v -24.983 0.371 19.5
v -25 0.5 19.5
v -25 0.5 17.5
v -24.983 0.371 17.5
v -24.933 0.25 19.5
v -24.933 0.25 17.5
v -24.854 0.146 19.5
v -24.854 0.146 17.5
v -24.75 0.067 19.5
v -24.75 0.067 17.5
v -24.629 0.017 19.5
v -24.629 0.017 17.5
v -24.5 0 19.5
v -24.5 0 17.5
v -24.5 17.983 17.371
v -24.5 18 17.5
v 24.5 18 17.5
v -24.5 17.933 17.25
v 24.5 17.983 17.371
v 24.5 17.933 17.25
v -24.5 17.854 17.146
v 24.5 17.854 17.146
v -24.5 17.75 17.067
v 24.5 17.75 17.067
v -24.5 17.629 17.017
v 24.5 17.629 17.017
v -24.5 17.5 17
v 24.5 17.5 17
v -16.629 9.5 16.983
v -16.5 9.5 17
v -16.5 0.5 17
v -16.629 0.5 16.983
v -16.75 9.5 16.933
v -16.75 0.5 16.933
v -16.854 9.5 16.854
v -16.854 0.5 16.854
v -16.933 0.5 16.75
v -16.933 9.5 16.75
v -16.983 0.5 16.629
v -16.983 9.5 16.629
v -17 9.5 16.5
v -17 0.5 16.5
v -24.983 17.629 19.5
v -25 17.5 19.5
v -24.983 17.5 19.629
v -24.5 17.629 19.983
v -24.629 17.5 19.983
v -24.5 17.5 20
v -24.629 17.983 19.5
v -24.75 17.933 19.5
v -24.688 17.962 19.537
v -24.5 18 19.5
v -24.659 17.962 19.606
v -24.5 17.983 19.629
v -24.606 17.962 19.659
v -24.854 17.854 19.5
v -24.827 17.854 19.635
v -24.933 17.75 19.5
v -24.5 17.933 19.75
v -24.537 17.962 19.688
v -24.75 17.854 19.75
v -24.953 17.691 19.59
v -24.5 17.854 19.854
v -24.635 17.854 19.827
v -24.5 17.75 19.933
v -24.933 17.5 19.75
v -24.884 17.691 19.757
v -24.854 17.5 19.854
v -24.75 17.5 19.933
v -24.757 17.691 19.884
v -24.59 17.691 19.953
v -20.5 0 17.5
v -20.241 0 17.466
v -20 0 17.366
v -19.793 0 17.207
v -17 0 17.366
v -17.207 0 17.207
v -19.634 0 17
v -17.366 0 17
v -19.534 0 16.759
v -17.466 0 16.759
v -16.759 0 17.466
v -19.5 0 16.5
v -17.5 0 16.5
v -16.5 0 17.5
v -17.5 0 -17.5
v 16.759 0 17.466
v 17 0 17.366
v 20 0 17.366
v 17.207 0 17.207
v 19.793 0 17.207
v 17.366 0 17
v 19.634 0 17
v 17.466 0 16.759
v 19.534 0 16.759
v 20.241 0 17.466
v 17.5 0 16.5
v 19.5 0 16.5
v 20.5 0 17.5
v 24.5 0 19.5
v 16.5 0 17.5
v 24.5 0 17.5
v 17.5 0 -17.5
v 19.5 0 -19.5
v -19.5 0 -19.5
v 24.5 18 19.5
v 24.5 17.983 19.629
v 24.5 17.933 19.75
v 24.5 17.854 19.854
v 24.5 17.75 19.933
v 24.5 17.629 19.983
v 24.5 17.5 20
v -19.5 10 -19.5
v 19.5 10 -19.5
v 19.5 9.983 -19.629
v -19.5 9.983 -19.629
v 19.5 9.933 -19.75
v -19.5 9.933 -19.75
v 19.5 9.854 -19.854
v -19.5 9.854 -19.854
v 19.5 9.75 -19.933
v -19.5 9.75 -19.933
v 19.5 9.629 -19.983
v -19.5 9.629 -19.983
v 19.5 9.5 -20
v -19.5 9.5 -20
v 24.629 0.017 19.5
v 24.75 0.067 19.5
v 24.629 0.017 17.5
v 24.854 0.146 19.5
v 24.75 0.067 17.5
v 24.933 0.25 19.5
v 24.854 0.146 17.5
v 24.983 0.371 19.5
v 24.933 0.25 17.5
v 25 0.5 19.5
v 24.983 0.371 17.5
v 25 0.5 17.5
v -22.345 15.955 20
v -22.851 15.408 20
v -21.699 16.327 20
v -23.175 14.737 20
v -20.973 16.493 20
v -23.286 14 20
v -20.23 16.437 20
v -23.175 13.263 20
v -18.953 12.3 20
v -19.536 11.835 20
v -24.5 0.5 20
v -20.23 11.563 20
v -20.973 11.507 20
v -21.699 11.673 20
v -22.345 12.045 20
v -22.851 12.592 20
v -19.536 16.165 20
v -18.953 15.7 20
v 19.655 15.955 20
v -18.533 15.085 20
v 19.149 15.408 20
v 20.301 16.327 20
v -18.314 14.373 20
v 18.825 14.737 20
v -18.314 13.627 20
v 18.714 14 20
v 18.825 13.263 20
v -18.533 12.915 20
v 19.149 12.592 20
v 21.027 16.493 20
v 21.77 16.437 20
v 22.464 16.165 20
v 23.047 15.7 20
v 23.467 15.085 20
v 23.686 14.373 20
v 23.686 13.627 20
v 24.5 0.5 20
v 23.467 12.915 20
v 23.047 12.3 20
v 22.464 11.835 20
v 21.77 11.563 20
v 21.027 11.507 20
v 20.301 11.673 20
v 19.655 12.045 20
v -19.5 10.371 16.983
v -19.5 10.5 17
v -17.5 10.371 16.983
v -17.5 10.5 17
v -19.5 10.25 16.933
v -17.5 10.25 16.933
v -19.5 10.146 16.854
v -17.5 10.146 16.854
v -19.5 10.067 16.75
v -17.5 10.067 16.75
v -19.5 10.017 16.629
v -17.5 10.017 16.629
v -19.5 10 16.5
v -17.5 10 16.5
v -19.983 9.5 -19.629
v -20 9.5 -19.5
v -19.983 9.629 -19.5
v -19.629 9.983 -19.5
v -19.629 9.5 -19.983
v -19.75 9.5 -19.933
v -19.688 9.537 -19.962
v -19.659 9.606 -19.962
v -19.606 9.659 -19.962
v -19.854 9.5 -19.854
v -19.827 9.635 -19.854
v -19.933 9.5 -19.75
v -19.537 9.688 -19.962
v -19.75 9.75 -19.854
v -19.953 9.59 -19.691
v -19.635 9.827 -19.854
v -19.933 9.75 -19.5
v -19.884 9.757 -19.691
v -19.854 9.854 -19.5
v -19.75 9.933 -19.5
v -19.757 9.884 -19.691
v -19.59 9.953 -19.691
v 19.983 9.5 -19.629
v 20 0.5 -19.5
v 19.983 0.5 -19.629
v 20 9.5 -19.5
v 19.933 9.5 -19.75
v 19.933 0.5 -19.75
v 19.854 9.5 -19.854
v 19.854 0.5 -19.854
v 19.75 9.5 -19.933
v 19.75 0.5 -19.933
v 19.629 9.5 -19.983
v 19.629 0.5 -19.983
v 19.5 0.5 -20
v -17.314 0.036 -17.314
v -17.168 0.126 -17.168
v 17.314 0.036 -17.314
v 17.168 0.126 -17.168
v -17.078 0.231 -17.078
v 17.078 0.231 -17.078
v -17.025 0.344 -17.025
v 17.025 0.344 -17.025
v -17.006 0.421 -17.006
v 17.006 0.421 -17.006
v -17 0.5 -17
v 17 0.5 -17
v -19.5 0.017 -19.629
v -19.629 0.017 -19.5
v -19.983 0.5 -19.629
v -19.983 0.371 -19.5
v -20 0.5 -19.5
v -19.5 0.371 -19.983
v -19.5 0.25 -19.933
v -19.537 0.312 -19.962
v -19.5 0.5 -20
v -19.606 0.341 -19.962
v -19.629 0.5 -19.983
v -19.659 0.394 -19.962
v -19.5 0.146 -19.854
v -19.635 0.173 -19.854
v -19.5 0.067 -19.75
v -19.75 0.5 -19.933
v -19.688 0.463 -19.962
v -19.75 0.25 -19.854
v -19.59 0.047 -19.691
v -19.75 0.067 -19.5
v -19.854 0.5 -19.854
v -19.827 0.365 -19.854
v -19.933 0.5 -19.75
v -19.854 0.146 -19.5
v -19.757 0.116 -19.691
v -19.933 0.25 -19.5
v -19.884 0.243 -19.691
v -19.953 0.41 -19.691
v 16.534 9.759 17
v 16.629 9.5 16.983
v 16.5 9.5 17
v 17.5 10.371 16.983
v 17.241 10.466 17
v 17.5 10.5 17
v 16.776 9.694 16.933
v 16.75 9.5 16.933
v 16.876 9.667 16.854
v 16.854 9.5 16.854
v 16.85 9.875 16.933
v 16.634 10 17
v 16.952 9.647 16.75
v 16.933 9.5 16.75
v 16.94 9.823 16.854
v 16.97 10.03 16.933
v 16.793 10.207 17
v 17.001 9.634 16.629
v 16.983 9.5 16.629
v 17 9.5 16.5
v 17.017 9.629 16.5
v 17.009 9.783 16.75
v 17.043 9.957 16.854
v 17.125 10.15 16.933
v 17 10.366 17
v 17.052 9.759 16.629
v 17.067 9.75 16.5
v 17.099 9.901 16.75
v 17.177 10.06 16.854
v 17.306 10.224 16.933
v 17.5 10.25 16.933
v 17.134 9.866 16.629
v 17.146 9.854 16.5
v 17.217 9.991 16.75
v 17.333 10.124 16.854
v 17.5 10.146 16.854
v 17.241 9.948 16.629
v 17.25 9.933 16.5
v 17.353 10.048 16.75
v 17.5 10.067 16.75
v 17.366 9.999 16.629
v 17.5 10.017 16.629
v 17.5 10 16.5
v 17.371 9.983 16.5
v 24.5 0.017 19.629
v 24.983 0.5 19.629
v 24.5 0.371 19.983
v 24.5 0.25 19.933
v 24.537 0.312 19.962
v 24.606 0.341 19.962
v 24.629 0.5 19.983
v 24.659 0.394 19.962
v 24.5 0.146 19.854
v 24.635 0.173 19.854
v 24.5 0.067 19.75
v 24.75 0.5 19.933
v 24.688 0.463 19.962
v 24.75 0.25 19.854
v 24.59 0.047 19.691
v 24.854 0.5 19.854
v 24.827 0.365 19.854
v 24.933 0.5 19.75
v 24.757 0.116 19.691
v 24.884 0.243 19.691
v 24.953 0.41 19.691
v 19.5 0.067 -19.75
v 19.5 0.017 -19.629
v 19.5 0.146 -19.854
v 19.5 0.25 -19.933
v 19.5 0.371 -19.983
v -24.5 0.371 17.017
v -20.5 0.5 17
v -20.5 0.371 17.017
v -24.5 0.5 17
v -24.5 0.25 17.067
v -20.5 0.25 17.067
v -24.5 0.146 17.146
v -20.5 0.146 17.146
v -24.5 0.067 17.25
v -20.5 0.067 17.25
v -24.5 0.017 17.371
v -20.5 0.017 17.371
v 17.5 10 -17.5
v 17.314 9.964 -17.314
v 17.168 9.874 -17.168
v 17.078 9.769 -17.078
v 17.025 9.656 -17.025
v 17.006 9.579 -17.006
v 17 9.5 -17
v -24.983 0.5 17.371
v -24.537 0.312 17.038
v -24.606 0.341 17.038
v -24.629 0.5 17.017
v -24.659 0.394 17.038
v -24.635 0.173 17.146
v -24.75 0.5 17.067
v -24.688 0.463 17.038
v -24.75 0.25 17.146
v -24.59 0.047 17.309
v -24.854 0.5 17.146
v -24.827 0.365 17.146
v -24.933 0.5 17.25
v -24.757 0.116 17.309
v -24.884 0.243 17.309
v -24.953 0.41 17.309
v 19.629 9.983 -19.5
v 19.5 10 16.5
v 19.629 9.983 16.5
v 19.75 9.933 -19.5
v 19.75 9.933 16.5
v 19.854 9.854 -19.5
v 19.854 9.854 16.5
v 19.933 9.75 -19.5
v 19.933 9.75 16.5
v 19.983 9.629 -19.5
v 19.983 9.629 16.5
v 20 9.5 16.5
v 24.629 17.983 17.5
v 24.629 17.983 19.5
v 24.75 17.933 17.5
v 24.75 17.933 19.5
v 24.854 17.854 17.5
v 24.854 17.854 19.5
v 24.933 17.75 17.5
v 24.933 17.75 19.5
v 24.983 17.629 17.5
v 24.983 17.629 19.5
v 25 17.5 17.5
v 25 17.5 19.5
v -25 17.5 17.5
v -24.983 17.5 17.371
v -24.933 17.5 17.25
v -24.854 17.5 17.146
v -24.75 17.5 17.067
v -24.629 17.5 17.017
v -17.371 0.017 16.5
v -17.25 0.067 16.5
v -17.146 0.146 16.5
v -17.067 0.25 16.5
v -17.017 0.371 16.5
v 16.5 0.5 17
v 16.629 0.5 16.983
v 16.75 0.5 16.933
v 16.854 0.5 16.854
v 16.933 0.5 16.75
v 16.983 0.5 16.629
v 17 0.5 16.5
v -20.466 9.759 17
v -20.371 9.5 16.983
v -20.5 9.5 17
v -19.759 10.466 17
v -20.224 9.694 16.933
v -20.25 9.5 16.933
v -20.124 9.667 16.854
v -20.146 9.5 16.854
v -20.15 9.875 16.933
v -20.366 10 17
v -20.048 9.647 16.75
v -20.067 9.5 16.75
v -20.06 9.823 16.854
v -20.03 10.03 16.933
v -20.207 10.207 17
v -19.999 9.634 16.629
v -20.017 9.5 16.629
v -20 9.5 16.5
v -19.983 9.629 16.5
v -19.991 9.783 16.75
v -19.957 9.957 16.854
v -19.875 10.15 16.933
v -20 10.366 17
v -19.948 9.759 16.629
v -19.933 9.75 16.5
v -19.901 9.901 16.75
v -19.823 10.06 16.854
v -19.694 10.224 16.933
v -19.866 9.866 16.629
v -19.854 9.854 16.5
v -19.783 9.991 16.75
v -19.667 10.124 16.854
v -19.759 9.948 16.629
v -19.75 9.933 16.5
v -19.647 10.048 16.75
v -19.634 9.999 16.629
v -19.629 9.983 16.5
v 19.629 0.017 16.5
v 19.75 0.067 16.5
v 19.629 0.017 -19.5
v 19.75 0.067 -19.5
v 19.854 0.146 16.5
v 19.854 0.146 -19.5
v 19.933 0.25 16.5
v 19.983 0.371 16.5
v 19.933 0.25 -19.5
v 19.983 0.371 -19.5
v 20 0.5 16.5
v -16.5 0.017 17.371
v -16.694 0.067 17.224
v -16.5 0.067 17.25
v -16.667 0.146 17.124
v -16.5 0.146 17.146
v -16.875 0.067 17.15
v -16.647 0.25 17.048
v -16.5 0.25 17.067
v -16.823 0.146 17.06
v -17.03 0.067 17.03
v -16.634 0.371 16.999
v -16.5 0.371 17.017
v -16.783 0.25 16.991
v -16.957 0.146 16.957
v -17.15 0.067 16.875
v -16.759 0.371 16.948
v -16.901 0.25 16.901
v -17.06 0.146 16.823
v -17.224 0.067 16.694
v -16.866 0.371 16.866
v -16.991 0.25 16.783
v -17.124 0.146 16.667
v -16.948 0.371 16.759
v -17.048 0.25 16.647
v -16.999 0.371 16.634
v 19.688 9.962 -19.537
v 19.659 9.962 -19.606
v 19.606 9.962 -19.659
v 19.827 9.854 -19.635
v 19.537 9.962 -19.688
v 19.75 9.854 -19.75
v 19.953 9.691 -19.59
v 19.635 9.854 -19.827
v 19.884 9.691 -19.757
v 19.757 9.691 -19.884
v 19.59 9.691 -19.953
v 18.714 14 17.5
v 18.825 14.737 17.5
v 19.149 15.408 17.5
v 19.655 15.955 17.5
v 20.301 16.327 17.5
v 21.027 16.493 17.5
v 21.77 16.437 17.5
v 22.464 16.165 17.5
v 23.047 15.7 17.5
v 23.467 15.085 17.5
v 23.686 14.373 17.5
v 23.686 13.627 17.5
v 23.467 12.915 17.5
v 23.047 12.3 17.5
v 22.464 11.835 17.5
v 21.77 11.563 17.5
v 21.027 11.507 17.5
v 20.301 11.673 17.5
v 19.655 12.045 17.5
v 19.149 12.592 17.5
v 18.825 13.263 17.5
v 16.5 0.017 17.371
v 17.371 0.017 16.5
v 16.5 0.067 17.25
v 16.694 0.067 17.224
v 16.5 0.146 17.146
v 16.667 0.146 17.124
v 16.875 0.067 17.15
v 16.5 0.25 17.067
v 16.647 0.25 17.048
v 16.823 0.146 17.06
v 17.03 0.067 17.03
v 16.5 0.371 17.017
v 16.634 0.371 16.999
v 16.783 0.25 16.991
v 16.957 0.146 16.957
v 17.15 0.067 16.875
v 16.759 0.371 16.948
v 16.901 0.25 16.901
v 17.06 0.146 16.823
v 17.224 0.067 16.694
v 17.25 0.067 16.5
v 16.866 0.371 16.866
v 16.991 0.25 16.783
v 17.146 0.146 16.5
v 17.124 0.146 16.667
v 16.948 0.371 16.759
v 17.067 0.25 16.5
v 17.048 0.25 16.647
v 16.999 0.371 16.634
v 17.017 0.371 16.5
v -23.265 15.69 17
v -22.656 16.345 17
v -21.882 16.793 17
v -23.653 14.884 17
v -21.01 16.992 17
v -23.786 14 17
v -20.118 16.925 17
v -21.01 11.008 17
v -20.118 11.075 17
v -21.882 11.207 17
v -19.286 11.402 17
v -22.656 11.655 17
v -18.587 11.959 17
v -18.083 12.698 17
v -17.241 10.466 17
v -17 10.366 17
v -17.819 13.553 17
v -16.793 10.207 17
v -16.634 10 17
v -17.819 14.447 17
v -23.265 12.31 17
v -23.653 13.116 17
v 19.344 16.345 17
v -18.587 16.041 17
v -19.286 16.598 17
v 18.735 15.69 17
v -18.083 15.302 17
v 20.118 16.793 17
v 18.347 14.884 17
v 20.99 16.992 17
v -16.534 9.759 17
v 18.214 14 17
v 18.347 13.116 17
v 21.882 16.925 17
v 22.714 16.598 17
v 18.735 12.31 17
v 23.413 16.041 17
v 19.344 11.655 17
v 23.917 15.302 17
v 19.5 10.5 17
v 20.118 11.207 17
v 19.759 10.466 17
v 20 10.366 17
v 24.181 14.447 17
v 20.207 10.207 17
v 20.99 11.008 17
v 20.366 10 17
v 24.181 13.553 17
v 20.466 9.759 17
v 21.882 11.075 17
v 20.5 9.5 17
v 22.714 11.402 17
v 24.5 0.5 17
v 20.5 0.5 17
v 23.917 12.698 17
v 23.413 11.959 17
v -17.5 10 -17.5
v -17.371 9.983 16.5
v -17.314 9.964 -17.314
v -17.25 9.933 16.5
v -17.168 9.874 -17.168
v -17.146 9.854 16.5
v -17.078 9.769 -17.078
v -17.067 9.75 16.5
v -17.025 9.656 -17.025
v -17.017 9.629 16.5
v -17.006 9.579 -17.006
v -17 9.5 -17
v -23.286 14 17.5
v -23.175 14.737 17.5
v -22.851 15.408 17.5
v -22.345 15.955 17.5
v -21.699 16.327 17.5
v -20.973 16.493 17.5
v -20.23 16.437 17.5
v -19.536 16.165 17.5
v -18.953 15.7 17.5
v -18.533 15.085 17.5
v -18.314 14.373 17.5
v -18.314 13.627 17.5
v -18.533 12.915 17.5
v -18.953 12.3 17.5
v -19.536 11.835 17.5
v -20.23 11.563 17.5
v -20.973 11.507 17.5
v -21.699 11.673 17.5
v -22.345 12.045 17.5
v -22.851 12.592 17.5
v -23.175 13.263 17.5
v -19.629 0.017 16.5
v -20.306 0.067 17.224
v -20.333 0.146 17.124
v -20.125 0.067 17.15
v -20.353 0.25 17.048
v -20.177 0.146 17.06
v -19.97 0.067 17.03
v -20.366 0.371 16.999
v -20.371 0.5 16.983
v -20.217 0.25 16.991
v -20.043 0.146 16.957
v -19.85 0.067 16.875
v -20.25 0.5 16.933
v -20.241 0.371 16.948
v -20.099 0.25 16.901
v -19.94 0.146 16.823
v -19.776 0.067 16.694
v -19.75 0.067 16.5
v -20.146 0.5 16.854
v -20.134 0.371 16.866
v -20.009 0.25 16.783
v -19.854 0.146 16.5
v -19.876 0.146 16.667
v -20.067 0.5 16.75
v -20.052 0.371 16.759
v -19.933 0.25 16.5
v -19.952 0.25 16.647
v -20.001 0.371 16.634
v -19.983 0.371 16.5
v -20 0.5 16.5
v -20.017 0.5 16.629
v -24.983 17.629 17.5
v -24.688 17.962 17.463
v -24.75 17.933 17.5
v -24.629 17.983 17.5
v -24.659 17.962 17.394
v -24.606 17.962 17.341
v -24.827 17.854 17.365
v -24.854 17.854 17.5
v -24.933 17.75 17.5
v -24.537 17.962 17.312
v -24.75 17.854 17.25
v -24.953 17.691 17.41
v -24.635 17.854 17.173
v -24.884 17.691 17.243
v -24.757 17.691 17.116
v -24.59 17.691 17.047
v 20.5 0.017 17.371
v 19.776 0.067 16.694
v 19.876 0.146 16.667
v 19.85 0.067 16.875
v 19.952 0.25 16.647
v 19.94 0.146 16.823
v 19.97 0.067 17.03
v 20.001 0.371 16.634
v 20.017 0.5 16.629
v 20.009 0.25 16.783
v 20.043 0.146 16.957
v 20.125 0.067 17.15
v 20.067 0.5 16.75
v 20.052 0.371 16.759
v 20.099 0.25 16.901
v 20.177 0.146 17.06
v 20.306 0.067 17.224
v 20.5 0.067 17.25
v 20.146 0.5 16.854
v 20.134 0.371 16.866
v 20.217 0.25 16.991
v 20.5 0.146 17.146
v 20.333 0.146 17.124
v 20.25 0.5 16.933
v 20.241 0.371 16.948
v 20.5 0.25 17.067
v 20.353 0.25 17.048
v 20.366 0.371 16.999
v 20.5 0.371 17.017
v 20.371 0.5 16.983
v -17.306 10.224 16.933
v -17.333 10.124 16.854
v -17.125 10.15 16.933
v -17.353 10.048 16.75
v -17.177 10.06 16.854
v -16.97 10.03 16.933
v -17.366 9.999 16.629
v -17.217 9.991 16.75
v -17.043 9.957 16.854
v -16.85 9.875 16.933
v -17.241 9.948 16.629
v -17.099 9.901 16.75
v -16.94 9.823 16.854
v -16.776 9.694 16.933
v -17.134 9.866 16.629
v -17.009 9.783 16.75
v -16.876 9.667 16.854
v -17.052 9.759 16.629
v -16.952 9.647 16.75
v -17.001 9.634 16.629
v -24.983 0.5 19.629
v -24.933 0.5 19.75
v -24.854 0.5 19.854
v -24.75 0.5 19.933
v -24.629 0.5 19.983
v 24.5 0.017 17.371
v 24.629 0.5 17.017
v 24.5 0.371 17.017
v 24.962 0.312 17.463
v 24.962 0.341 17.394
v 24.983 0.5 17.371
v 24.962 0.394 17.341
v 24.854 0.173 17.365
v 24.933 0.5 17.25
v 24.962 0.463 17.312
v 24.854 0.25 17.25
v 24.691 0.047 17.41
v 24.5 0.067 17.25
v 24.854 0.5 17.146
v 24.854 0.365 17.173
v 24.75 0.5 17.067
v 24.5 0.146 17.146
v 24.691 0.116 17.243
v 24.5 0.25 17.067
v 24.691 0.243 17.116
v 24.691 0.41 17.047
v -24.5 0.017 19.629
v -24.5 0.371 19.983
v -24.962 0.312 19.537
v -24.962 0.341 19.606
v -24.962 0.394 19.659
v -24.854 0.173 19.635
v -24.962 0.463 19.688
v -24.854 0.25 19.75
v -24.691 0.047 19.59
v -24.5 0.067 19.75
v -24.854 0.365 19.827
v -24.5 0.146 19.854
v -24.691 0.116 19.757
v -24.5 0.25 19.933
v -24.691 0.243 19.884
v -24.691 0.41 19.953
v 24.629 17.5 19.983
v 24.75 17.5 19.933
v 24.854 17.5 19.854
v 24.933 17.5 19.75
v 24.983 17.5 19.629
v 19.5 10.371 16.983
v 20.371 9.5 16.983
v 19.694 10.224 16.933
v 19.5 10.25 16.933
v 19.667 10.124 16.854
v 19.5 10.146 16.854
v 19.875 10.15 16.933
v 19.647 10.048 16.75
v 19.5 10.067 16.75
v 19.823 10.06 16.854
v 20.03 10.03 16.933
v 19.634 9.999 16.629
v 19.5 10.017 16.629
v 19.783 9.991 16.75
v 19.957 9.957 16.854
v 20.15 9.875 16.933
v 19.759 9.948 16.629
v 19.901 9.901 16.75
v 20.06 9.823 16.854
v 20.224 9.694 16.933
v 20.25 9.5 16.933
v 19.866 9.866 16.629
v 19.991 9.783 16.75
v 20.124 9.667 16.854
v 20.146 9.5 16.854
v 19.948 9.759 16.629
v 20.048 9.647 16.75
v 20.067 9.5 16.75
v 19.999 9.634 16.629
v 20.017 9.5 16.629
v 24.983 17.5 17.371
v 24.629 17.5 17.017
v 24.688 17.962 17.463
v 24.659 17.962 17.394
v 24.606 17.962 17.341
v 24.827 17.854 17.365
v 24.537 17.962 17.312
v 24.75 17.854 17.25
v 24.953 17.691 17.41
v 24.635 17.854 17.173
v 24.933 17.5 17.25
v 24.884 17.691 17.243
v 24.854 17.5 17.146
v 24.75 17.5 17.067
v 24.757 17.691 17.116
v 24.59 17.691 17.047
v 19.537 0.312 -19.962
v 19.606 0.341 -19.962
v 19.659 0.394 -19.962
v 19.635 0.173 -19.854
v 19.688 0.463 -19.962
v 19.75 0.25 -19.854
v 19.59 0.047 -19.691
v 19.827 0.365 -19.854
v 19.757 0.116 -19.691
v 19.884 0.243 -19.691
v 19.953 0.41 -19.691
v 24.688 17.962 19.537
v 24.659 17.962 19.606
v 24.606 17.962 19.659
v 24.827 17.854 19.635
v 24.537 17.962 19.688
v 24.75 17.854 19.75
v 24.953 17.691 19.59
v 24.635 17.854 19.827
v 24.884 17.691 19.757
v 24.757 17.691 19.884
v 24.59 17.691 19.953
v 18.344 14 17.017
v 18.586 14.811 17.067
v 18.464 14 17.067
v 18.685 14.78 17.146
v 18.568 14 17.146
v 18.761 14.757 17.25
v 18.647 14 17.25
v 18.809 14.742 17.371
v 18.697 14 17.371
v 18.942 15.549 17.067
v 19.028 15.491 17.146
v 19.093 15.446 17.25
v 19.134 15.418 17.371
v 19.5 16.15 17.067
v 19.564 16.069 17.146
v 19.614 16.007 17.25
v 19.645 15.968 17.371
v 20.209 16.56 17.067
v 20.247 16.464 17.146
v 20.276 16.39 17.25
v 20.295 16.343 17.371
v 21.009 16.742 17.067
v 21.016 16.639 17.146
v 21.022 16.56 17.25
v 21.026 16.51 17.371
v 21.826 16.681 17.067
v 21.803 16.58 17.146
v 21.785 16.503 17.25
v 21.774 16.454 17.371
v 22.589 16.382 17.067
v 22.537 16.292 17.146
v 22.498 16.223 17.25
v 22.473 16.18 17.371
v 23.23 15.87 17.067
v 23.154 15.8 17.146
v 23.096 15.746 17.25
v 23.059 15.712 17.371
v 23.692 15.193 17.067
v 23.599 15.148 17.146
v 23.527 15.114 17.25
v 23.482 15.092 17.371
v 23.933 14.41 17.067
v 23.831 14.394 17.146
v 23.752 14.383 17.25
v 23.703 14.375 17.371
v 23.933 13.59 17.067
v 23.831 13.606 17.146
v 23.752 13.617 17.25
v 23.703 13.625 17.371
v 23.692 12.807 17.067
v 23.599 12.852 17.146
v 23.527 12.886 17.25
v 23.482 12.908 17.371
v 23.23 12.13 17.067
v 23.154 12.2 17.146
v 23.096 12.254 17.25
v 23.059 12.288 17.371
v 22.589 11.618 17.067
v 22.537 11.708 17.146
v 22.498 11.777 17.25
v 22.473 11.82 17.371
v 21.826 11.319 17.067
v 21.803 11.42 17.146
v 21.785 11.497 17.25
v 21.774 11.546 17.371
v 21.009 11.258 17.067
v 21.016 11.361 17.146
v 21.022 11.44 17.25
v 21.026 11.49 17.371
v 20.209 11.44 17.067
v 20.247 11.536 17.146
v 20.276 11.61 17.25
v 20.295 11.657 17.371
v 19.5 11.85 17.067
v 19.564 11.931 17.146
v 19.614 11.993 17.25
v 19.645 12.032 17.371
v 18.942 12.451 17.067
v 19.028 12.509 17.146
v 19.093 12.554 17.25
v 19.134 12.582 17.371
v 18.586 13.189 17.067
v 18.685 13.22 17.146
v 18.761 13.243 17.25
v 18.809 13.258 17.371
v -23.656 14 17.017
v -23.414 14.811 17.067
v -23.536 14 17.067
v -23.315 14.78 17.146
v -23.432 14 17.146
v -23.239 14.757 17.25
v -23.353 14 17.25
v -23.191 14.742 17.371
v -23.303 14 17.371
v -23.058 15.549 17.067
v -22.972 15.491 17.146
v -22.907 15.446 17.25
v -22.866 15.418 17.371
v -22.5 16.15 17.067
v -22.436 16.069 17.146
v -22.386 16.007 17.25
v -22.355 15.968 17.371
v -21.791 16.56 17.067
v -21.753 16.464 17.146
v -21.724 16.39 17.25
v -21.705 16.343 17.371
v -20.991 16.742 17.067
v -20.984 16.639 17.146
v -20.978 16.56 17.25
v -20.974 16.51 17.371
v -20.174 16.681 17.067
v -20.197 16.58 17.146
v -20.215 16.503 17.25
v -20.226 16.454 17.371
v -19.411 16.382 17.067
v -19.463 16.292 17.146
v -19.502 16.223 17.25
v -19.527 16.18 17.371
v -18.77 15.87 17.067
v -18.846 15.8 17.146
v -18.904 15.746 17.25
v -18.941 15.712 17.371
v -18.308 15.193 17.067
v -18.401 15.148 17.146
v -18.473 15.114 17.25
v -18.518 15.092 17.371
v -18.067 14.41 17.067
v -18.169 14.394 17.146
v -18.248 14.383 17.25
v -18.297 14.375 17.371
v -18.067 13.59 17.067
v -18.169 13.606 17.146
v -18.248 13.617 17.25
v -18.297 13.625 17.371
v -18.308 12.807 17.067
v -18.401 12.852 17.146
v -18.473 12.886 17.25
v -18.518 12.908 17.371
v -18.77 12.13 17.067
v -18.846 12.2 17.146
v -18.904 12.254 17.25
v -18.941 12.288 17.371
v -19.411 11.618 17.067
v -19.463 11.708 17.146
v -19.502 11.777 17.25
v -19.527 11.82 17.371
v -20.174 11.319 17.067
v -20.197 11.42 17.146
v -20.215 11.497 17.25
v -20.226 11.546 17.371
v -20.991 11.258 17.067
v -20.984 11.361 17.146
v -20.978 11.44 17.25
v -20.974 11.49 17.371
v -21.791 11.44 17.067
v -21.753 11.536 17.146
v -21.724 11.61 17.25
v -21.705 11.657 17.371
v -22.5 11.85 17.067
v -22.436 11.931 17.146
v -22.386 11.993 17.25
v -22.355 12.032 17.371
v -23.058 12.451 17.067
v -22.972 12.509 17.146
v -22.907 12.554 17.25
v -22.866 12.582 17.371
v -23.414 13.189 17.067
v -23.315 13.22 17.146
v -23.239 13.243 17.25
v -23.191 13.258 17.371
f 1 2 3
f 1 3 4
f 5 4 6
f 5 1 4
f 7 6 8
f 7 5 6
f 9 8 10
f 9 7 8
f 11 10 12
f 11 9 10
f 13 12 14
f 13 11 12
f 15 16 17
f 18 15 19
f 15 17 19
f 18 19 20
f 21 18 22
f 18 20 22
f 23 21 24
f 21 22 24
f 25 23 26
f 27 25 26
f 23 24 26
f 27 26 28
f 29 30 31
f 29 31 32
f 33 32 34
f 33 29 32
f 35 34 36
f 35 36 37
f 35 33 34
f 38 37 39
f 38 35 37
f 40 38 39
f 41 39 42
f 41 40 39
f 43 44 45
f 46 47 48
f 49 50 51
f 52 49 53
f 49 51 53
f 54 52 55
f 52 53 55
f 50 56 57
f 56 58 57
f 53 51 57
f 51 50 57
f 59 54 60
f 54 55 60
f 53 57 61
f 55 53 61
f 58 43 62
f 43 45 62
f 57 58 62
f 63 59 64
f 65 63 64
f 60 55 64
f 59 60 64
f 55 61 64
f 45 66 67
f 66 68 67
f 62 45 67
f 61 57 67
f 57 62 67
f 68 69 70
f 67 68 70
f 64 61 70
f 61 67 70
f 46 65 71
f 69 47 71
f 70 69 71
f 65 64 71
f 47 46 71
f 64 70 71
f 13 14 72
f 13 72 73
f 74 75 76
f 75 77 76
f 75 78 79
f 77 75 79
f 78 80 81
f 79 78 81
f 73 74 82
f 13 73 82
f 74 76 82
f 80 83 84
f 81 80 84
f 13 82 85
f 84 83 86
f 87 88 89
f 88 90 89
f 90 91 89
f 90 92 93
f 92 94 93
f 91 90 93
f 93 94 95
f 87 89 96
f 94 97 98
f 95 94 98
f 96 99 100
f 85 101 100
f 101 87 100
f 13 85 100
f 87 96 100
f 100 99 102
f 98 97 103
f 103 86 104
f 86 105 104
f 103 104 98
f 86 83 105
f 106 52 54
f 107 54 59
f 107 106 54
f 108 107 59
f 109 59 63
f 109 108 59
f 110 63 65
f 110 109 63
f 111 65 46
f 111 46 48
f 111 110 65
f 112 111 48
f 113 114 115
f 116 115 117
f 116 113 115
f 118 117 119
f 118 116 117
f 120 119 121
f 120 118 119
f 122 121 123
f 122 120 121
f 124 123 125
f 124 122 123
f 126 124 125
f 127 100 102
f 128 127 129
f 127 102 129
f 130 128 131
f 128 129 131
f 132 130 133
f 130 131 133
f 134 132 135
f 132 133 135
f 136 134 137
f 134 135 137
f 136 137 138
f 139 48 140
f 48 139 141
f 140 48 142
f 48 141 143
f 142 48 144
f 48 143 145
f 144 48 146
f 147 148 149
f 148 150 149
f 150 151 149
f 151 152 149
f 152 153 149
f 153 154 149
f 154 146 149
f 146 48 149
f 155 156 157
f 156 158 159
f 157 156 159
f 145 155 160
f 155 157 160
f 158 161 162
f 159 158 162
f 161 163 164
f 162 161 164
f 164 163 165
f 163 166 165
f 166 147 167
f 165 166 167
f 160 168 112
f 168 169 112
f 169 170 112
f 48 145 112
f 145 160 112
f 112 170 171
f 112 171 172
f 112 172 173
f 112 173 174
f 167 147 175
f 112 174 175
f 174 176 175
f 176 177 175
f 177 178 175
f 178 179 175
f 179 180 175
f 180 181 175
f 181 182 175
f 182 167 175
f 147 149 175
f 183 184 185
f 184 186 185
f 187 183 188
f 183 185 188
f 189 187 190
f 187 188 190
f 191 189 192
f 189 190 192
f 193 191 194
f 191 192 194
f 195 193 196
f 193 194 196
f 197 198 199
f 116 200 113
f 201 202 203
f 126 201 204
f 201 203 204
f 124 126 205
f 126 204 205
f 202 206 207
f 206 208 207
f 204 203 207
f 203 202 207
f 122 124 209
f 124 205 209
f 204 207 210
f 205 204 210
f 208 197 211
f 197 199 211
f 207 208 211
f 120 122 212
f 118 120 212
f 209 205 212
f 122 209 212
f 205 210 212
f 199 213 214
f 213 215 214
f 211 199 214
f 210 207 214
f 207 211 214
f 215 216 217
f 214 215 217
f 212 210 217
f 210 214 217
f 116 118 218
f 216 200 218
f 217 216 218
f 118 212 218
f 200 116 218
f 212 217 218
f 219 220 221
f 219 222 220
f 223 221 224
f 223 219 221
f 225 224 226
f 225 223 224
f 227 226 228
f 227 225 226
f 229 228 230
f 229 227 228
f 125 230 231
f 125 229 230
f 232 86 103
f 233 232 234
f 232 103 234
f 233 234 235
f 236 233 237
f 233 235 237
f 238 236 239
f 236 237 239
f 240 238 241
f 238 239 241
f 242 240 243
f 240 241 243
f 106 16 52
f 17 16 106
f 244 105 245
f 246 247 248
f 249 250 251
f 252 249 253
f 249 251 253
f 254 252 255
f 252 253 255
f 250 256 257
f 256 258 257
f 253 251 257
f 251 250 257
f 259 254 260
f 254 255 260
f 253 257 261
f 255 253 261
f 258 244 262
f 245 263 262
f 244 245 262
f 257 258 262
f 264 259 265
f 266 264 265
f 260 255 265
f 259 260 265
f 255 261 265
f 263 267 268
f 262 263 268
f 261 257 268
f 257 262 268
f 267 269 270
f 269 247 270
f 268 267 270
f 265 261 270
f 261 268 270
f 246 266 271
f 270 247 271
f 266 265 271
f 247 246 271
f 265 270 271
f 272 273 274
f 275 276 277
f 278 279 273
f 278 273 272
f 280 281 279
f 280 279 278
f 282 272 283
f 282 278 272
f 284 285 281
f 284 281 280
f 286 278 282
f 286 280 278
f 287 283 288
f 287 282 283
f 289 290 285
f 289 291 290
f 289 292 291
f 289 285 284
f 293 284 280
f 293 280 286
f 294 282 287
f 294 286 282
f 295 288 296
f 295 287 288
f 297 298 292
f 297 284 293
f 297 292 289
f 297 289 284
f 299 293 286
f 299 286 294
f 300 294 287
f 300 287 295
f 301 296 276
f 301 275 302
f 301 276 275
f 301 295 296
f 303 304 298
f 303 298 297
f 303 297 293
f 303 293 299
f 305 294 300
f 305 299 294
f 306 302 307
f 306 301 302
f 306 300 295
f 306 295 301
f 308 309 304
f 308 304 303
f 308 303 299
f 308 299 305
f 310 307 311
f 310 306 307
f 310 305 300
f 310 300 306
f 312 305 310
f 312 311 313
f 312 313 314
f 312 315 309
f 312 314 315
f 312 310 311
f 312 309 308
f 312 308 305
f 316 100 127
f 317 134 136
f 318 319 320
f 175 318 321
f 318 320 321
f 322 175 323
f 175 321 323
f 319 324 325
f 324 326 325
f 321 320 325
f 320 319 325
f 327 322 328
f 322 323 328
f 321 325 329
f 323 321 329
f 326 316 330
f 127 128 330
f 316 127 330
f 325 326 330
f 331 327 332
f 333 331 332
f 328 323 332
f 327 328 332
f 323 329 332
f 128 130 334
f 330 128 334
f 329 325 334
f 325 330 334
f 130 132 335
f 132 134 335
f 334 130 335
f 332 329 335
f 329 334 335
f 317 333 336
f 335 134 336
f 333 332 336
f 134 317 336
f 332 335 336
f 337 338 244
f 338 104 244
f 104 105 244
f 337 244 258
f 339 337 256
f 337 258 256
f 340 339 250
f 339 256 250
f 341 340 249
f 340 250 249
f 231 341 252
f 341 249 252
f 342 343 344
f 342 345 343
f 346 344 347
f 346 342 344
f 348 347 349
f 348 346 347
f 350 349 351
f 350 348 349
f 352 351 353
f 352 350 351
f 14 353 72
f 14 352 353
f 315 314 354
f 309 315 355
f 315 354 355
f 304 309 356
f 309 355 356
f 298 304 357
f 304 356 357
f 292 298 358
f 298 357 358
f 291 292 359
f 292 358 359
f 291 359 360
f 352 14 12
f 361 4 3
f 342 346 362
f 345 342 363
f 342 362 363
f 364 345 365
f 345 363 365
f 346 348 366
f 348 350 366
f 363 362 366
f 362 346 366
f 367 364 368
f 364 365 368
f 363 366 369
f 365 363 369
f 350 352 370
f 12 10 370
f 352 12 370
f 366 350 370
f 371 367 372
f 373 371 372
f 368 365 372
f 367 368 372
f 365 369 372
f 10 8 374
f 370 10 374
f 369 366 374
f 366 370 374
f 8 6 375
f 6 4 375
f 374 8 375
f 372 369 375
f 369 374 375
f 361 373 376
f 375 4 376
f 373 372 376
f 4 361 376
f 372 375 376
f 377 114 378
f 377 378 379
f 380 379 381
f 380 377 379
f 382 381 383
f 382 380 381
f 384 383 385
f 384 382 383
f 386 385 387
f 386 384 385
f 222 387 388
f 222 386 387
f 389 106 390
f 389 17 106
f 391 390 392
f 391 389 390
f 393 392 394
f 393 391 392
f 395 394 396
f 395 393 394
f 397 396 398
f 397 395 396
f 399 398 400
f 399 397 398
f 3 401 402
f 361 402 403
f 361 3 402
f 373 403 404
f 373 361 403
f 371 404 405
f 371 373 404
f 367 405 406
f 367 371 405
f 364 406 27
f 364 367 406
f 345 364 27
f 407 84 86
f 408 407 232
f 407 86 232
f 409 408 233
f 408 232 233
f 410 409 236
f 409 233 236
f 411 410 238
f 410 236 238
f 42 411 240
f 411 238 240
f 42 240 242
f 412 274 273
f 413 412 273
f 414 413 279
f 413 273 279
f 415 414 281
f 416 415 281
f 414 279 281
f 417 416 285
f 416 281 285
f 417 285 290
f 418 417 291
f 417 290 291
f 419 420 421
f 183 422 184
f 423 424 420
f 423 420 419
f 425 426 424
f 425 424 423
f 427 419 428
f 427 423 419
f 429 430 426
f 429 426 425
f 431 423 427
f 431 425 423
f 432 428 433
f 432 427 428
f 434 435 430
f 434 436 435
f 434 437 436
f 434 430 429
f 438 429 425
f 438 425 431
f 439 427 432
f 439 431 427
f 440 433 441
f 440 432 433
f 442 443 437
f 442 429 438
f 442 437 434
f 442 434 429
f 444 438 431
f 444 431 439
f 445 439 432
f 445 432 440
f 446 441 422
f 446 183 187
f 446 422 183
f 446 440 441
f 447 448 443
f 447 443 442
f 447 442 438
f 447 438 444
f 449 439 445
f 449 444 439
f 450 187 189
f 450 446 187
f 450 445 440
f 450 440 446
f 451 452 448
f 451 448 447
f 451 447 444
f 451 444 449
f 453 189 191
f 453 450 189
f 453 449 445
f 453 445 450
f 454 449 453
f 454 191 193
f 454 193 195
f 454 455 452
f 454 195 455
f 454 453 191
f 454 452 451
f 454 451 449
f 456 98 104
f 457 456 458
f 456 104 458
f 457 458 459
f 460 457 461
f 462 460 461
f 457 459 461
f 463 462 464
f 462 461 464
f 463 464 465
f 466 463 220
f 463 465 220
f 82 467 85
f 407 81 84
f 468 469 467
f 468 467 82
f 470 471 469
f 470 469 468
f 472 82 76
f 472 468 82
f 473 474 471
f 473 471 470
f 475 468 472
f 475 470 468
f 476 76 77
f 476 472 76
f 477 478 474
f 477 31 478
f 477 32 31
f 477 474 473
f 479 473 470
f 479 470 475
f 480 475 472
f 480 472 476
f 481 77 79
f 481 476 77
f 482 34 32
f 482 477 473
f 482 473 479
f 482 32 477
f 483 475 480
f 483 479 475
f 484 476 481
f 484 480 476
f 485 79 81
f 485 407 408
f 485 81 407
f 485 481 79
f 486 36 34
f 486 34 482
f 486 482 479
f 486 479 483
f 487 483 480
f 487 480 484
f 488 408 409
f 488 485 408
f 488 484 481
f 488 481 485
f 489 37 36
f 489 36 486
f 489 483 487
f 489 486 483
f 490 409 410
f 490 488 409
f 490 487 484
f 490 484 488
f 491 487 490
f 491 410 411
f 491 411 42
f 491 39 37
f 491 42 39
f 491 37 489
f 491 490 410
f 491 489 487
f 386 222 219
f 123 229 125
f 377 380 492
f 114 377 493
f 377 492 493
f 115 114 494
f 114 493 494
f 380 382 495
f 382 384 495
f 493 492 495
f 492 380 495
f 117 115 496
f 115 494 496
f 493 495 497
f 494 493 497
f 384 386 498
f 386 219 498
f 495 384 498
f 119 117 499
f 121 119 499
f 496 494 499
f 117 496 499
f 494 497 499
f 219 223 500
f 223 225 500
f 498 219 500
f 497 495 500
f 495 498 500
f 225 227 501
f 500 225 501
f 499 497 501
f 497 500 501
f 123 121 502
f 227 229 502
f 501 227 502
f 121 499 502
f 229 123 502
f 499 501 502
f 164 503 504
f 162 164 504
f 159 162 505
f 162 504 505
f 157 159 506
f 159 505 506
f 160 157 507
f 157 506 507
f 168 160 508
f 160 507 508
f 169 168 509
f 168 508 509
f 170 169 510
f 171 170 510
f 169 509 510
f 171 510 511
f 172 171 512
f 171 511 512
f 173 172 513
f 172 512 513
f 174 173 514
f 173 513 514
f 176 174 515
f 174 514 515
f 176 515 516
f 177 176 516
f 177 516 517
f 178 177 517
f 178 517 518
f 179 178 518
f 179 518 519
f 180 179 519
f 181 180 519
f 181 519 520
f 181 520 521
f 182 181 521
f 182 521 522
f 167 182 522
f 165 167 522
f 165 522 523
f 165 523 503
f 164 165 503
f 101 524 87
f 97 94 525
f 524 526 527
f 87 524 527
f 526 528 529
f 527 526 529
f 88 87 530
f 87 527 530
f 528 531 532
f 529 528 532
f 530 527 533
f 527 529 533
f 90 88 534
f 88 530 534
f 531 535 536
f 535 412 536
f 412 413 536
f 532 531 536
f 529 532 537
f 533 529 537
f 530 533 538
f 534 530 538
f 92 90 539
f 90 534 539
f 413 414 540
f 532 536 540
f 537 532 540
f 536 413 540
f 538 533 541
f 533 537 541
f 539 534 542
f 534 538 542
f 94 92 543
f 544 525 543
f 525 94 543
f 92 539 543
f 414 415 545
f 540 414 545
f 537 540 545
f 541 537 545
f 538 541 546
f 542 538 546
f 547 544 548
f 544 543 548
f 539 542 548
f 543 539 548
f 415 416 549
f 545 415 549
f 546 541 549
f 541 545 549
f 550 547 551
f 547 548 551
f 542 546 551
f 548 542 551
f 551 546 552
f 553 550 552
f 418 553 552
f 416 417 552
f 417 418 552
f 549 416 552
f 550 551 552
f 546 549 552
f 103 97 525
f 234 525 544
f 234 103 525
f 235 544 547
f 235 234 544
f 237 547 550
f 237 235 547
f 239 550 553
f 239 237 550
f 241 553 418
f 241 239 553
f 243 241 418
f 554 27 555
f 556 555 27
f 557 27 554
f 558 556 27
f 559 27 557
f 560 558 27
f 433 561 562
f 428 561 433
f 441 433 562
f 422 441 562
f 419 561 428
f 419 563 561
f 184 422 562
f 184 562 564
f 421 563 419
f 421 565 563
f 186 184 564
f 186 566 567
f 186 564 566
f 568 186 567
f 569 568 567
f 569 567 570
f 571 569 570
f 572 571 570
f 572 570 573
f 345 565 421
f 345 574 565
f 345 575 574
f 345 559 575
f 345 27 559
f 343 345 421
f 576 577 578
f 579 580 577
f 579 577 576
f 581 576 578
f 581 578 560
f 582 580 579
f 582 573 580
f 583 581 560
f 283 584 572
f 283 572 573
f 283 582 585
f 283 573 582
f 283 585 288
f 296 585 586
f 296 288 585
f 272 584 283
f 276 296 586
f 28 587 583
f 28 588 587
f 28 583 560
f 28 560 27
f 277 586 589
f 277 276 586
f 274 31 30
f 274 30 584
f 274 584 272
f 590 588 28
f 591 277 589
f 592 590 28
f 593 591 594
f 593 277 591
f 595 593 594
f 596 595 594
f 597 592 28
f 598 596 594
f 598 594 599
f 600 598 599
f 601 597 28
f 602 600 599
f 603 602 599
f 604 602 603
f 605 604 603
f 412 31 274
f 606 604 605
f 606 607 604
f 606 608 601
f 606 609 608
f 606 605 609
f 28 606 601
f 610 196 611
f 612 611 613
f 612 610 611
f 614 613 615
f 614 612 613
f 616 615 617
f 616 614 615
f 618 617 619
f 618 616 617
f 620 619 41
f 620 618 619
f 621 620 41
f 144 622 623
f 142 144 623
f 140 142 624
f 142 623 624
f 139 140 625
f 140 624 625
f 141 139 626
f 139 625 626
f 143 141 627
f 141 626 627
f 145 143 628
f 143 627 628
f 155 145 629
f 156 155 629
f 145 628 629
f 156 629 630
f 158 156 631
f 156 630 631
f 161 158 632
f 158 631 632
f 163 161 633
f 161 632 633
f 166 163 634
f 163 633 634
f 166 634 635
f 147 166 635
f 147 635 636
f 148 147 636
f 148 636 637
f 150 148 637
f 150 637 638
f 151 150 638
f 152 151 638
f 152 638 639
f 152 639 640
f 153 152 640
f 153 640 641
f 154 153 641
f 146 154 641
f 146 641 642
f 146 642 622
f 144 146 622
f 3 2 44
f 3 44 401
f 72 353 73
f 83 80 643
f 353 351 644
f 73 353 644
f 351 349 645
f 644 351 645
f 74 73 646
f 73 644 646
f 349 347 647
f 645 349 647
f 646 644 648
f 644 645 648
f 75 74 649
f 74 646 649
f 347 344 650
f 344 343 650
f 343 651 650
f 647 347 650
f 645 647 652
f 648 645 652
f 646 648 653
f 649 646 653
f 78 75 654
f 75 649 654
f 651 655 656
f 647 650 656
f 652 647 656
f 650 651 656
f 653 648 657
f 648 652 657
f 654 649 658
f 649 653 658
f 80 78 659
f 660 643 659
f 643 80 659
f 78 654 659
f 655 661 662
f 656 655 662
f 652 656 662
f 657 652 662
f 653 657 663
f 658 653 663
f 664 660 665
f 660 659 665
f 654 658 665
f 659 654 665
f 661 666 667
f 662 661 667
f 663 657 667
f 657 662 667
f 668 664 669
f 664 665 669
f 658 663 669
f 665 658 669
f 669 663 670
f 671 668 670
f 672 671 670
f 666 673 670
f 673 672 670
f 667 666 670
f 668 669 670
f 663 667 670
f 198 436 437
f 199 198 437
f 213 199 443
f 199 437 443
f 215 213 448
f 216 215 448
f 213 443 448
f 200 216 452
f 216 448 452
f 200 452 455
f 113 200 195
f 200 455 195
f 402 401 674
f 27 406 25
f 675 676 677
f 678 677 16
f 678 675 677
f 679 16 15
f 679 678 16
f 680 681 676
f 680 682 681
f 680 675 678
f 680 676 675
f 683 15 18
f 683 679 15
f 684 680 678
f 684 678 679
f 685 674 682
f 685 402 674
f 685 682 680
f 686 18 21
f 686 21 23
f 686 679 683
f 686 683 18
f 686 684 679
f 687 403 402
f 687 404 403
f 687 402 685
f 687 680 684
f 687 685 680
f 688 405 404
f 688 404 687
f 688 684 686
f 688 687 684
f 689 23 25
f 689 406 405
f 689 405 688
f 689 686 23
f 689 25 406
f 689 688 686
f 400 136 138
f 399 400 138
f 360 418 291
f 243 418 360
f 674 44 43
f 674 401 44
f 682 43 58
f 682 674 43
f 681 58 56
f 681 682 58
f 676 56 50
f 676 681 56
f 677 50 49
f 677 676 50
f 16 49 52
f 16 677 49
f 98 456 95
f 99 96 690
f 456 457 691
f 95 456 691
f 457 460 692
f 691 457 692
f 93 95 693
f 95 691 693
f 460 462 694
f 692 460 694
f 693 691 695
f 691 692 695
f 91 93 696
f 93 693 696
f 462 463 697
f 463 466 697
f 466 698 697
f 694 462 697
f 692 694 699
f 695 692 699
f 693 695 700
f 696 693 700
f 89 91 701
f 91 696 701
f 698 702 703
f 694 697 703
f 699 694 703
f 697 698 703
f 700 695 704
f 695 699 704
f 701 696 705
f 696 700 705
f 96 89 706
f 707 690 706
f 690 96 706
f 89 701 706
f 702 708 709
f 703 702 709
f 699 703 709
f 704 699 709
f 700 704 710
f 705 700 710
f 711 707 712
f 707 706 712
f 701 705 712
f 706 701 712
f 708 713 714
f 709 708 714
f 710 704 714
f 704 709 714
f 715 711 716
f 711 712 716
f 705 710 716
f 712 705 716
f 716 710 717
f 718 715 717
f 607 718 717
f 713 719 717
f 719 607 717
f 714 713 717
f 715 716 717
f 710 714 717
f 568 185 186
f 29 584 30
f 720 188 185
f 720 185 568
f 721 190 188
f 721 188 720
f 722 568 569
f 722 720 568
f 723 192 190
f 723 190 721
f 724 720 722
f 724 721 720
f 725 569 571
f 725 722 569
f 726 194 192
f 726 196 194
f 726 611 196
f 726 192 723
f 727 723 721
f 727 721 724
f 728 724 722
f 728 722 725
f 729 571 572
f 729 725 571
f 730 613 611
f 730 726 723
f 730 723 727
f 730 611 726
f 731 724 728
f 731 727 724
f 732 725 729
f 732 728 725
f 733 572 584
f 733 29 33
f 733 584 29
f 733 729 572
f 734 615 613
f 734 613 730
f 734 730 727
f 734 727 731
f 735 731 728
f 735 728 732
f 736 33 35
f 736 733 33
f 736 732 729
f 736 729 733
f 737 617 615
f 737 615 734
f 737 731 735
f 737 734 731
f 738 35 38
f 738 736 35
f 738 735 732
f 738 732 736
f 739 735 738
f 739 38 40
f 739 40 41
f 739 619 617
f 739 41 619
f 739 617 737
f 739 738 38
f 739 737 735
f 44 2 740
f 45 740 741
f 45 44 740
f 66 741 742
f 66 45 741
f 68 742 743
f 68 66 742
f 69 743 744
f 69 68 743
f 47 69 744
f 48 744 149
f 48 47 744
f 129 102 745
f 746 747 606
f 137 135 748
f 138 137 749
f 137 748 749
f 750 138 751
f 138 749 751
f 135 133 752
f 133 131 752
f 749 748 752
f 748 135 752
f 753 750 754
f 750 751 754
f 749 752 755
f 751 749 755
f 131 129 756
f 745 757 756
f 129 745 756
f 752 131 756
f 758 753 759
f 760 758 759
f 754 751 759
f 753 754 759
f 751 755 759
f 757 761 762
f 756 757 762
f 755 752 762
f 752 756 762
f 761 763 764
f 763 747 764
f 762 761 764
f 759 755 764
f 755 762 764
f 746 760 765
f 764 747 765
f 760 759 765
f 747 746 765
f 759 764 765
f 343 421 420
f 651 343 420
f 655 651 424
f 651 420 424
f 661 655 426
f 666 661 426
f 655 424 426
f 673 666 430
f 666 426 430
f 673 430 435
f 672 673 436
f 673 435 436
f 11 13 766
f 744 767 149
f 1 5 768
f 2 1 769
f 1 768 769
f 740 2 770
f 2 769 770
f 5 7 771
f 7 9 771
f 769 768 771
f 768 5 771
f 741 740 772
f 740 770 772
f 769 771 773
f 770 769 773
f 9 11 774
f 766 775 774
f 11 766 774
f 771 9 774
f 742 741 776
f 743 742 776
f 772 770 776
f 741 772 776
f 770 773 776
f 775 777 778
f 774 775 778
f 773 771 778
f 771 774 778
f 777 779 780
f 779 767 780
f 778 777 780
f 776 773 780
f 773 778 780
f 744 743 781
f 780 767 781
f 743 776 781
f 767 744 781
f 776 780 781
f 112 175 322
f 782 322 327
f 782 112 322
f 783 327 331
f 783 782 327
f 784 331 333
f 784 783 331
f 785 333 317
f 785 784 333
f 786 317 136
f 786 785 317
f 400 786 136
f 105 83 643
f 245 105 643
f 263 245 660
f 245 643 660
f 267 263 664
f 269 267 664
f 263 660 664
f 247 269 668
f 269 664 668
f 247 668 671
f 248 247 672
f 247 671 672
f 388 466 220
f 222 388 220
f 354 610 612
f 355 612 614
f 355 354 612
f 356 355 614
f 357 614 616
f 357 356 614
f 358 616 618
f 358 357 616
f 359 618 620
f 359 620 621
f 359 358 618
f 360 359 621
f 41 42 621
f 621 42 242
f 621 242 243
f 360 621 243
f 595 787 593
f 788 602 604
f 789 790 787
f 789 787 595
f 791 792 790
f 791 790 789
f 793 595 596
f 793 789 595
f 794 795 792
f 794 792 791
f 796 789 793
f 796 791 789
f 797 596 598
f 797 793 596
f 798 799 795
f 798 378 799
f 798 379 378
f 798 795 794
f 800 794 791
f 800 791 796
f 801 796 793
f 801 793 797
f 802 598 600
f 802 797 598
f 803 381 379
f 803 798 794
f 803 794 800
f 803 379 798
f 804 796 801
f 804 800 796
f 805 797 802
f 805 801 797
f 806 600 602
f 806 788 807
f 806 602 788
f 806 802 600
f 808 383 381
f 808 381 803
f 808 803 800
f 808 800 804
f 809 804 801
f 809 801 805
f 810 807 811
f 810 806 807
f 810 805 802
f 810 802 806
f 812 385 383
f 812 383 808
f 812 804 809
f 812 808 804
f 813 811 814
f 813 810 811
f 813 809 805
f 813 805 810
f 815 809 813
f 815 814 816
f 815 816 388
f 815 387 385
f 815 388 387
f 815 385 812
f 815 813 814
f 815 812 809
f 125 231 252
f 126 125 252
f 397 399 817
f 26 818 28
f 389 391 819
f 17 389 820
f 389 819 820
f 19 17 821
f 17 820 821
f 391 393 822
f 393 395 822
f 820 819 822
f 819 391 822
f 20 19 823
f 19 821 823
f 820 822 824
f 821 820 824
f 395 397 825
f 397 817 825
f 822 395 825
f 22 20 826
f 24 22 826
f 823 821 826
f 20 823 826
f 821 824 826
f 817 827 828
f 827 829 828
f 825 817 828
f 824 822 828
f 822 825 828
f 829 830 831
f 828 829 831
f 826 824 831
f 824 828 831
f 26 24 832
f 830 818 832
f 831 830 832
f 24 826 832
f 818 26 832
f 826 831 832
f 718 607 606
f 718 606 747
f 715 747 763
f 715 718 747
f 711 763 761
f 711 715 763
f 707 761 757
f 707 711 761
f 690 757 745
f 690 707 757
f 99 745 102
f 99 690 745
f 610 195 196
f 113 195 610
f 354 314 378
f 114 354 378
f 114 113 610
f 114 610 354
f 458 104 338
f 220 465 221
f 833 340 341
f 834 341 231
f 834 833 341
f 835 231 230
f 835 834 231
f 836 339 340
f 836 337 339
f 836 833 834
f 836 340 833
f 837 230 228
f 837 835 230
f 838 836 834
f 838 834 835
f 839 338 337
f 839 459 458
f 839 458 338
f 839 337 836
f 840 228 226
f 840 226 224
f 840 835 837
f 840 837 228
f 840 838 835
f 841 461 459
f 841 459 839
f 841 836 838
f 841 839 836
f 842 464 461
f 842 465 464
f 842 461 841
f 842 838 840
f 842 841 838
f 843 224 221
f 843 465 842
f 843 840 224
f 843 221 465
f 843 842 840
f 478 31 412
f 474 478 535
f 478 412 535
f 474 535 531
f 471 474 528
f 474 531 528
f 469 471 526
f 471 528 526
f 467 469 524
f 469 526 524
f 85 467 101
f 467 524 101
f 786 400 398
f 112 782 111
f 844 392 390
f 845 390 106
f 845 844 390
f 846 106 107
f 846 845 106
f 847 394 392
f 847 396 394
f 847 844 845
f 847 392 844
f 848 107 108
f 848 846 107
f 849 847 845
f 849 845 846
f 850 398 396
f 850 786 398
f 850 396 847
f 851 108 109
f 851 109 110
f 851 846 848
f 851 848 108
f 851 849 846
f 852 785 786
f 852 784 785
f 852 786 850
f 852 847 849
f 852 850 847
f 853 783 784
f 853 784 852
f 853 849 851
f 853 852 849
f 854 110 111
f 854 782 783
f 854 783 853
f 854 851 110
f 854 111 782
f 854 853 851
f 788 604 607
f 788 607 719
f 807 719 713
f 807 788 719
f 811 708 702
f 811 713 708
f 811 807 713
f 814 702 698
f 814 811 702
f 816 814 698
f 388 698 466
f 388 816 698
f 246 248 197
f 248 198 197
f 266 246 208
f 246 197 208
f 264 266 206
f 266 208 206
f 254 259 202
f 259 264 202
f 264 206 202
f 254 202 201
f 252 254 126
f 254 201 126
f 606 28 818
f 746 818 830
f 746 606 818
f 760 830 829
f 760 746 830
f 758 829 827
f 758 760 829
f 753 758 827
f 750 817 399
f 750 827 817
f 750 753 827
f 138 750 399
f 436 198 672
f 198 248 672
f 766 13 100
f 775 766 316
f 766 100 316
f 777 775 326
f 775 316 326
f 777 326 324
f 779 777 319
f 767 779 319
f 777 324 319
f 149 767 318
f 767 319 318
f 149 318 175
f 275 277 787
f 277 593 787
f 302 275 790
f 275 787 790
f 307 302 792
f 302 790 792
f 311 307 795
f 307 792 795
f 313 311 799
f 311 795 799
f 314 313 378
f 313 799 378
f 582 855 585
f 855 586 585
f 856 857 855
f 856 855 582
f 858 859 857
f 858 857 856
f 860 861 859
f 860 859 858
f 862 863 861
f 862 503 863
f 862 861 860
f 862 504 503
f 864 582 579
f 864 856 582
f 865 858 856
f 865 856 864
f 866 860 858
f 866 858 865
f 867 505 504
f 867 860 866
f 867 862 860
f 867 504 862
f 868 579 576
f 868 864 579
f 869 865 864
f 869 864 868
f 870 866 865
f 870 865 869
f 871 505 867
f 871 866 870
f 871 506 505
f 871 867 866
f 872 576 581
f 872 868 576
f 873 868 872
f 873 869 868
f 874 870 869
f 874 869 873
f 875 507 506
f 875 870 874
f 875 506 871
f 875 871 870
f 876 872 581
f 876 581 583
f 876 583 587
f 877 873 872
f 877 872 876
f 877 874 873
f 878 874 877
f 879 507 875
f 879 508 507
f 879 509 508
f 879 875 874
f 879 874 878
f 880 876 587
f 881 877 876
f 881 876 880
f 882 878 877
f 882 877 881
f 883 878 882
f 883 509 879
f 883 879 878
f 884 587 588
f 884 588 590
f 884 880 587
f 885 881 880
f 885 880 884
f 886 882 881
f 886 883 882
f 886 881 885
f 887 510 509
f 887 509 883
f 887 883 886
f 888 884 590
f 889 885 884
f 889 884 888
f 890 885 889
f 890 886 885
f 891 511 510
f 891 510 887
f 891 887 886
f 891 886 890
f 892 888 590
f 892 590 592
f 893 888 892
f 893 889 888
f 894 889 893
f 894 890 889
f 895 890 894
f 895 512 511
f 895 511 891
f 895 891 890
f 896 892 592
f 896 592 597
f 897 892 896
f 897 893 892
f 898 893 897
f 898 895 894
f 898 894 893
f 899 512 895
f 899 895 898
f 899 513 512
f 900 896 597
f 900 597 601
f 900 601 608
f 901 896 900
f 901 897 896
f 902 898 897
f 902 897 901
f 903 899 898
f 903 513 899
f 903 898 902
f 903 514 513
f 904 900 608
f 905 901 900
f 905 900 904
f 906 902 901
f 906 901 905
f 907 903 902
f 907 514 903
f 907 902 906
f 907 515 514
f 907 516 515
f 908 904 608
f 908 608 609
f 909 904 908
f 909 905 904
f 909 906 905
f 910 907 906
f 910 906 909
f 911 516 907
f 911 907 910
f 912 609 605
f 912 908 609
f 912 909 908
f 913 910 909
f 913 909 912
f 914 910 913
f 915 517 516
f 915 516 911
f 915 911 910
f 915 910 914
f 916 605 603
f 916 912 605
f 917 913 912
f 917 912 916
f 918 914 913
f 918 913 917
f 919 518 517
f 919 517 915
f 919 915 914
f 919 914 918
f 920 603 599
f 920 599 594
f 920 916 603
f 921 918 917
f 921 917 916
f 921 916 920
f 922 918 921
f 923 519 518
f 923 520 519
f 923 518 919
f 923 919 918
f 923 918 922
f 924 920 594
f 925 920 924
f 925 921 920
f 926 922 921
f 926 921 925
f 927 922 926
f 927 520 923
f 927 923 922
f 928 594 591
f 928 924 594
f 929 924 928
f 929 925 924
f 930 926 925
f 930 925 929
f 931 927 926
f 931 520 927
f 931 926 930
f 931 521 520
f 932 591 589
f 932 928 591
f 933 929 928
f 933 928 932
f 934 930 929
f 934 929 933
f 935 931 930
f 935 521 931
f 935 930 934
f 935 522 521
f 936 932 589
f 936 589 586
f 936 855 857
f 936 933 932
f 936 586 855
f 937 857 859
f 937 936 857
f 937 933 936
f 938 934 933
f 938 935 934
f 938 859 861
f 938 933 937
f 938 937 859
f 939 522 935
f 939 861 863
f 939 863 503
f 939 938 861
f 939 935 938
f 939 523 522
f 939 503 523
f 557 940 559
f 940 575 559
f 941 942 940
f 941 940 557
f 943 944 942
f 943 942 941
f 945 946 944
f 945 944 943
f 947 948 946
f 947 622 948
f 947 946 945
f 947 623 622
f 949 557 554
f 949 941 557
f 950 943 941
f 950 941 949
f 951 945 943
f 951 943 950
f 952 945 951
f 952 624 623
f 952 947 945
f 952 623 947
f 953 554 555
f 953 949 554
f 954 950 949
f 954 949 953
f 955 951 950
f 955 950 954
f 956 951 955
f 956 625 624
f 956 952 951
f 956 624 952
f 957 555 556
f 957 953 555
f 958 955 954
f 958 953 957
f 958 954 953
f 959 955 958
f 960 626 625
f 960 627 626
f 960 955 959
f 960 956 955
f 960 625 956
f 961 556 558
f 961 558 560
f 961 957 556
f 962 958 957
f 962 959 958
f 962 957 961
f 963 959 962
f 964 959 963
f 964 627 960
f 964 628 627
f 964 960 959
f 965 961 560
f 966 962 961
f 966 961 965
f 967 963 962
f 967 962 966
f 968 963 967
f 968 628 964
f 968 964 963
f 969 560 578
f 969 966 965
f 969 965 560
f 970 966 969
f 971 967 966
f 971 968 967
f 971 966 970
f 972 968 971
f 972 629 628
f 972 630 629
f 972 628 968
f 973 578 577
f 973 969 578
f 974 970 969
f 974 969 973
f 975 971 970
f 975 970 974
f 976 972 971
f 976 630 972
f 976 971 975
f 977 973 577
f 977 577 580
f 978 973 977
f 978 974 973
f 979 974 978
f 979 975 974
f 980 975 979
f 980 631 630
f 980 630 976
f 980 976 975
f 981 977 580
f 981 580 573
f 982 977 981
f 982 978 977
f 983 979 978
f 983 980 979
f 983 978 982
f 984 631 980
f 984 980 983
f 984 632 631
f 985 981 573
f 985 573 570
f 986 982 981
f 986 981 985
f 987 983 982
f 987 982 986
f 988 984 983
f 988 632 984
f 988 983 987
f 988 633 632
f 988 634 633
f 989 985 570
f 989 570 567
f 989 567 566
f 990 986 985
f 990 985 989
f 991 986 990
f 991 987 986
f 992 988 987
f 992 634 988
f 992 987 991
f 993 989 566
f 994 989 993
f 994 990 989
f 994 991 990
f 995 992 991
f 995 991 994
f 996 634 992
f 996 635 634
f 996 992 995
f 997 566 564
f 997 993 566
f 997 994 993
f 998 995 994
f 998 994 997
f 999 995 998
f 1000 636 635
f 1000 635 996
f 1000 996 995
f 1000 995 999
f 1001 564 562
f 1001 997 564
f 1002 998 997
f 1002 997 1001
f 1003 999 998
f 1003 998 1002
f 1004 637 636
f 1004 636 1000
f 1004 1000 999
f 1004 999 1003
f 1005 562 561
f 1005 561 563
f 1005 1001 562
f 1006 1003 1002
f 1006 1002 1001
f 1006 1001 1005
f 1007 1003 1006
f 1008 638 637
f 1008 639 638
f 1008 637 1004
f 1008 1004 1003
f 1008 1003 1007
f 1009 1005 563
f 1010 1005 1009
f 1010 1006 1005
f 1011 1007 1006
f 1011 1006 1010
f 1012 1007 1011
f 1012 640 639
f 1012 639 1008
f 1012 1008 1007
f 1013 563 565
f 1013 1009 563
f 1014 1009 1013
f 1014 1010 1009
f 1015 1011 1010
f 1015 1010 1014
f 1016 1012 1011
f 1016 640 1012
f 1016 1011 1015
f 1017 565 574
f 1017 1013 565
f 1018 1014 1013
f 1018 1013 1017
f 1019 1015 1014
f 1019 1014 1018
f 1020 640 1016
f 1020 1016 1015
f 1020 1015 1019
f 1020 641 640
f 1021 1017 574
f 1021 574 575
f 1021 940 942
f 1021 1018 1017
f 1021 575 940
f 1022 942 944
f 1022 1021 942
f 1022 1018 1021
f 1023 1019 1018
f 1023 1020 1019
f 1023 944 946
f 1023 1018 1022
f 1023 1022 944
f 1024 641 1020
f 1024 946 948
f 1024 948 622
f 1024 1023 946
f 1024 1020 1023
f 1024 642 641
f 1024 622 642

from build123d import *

# Parameters (mm, degrees)
SKETCH_2_W          = 34
SKETCH_2_H          = 34
EXTRUDE_1_DEPTH     = 10
SKETCH_2_3_W        = 50
SKETCH_2_3_H        = 3
EXTRUDE_2_DEPTH     = 18
SKETCH_4_R          = 2.5
CUT_EXTRUDE_1_DEPTH = 20
FILLET_1_R          = 0.5


with BuildPart() as part:
    # 草图2 → 凸台-拉伸1 (new body)
    with BuildSketch(Plane(origin=(0, 0, 0), x_dir=(1, 0, 0), z_dir=(0, 1, 0))):
        Polygon((25, -20), (25, -17), (20, -17), (20, 20), (-20, 20), (-20, -17), (-25, -17), (-25, -20), align=None)
        Rectangle(SKETCH_2_W, SKETCH_2_H, mode=Mode.SUBTRACT)
    extrude(amount=EXTRUDE_1_DEPTH)

    # 草图2<3> → 凸台-拉伸2 (add)
    with BuildSketch(Plane(origin=(0, 0, 0), x_dir=(1, 0, 0), z_dir=(0, 1, 0))):
        with Locations((0, -18.5)):
            Rectangle(SKETCH_2_3_W, SKETCH_2_3_H)
    extrude(amount=EXTRUDE_2_DEPTH)

    # 草图4 → 切除-拉伸1 (cut)
    with BuildSketch(Plane(origin=(0, 0, 17), x_dir=(-1, 0, 0), z_dir=(0, 0, -1))):
        with Locations((-21.214140071, 14)):
            Circle(SKETCH_4_R)
        with Locations((20.785859929, 14)):
            Circle(SKETCH_4_R)
    extrude(amount=-CUT_EXTRUDE_1_DEPTH, mode=Mode.SUBTRACT)

    # 圆角1
    fillet_1_edges = [part.edges().sort_by_distance(p)[0] for p in [
        (-25, 9, 20),
        (25, 9, 20),
        (0, 18, 20),
        (-25, 18, 18.5),
        (25, 18, 18.5),
        (-25, 0, 18.5),
        (0, 0, 20),
        (25, 0, 18.5),
        (20, 0, -1.5),
        (-20, 0, -1.5),
        (0, 0, -17),
        (17, 0, 0),
        (-17, 0, 0),
        (20, 10, -1.5),
        (17, 10, 0),
        (0, 10, -17),
        (-17, 10, 0),
        (-20, 10, -1.5),
        (20, 5, -20),
        (0, 10, -20),
        (-20, 5, -20),
        (0, 0, -20),
        (17, 5, 17),
        (18.5, 10, 17),
        (20, 5, 17),
        (22.5, 0, 17),
        (25, 9, 17),
        (0, 18, 17),
        (-25, 9, 17),
        (-22.5, 0, 17),
        (-20, 5, 17),
        (-18.5, 10, 17),
        (-17, 5, 17),
        (0, 0, 17),
        (-18.285859929, 14, 17),
        (23.714140071, 14, 17),
    ]]
    fillet(fillet_1_edges, radius=FILLET_1_R)


solid = part.part
